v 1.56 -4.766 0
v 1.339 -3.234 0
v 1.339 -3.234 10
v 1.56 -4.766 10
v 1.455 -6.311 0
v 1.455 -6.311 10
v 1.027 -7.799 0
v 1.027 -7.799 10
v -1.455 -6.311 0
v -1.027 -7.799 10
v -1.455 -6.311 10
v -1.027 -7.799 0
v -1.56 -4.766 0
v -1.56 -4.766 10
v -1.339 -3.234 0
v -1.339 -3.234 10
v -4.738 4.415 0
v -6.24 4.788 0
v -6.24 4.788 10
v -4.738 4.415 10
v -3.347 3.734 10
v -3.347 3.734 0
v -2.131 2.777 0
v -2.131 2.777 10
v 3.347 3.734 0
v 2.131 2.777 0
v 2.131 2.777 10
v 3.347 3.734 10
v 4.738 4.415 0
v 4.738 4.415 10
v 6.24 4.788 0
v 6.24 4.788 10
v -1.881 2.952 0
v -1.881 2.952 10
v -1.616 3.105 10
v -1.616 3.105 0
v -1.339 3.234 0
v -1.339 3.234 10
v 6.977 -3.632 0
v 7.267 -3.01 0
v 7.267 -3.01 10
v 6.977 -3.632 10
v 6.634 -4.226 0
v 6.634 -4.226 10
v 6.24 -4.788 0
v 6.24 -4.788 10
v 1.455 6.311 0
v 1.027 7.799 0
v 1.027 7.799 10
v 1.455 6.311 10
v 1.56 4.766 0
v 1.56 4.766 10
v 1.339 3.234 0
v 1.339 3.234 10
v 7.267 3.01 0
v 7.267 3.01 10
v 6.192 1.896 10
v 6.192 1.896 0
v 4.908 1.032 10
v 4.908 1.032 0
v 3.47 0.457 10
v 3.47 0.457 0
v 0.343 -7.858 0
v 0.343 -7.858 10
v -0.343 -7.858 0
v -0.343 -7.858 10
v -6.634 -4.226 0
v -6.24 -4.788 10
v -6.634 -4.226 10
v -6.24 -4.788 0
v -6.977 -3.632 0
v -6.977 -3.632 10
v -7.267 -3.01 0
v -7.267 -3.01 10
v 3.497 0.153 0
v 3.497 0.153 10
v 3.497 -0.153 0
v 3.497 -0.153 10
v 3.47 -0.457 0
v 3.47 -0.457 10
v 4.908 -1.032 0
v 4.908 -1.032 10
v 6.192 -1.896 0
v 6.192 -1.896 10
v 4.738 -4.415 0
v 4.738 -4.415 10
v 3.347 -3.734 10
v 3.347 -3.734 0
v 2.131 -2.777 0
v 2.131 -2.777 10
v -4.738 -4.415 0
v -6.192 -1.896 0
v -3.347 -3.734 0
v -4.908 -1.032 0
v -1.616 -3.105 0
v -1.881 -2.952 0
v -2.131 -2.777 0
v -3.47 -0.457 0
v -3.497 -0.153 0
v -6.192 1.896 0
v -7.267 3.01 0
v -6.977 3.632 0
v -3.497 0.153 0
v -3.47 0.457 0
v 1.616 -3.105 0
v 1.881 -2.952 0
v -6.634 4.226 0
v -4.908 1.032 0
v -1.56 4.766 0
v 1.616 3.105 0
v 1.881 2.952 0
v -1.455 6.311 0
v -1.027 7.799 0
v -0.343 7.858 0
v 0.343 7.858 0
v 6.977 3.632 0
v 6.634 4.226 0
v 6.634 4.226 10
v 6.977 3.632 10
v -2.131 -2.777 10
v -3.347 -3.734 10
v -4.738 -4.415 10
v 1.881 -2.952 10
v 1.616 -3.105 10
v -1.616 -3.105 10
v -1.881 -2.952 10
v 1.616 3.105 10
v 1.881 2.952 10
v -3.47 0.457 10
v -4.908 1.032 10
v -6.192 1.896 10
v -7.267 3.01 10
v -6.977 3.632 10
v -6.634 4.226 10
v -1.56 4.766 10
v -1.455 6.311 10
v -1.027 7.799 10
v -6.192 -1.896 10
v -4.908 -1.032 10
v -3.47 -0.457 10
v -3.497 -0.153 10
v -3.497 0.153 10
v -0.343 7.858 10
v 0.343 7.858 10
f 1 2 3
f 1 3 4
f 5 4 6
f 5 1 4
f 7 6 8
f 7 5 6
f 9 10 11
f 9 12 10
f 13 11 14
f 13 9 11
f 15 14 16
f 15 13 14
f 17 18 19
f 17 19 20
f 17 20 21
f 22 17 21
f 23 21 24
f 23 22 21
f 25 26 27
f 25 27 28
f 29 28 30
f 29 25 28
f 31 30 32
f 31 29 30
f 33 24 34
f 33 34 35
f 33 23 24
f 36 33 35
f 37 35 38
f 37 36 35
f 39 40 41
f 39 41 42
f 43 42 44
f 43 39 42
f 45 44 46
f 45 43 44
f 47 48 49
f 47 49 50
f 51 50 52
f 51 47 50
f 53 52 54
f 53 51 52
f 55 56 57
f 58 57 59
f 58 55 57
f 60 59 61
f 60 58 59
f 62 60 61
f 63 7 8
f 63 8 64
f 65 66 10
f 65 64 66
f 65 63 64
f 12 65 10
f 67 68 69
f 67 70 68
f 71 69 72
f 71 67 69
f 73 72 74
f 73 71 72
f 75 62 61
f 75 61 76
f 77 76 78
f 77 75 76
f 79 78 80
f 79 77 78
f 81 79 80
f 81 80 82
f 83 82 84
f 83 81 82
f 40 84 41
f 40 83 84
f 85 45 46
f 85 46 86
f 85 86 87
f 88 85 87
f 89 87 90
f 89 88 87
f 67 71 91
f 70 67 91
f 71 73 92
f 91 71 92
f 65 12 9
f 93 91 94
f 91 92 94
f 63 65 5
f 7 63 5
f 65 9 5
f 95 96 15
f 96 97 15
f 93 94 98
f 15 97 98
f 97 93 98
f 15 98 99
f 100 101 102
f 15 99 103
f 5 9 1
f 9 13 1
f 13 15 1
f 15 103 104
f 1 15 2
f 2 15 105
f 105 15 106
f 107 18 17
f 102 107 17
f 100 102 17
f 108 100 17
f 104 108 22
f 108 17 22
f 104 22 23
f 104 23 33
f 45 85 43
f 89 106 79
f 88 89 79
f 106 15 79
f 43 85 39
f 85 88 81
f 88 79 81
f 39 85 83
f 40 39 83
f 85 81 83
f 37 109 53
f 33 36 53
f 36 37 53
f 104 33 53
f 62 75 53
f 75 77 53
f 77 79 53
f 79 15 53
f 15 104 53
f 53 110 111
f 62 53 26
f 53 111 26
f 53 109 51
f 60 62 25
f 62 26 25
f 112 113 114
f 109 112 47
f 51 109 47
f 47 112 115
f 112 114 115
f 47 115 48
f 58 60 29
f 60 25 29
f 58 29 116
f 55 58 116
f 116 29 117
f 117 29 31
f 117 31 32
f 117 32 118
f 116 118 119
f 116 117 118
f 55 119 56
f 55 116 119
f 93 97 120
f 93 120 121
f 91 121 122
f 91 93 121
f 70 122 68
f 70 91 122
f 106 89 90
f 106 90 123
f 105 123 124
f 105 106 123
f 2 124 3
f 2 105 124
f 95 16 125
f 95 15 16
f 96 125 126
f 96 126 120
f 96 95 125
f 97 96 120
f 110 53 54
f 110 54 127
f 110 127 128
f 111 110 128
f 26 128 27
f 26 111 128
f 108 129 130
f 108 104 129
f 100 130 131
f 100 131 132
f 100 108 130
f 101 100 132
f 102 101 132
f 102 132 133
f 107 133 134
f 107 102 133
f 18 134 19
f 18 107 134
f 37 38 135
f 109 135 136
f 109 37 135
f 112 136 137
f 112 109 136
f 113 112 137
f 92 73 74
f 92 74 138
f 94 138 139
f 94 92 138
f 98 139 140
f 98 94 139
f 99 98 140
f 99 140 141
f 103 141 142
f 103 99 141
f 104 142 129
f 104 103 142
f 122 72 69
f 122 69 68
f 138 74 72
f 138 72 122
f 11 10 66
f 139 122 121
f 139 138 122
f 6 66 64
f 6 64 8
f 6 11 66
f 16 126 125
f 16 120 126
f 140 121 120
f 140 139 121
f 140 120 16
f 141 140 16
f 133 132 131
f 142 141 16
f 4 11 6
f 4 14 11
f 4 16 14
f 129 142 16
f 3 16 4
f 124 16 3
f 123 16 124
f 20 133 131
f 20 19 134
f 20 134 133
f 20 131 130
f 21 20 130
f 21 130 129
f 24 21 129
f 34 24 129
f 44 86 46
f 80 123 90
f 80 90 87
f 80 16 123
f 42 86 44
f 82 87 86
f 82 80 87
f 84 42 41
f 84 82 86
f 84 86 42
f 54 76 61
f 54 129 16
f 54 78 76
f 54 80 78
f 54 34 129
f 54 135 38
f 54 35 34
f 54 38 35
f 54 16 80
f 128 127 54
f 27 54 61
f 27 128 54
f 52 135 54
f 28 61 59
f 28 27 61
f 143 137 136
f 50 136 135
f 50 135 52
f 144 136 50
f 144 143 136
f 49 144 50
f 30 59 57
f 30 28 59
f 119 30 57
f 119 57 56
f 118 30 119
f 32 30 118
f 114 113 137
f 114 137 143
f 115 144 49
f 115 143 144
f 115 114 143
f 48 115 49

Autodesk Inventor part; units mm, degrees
sketch "Sketch1" plane through (0, 0, 0) normal (0, 0, 1) x (1, 0, 0)
  circle A0 centre (0, 0) radius 7.8659
  dimension "d0" = 15.7318
extrude "Extrusion1" add sketch "Sketch1" along normal blind 10
ref_plane "Work Plane2" through (0, 0, 5) normal (0, 0, 1) x (1, 0, 0)
sketch "Sketch2" plane through (0, 0, 0) normal (0, 0, -1) x (-1, 0, 0)
  circle A0 centre (0, 0) radius 7.8659 projected
  circle A1 centre (0, 0) radius 6
  dimension "d3" = 12
surface extrude "Pitch Diameter" sketch "Sketch2" against normal through all shown no curves A1
ref_plane "Work Plane8" through (0, 0, 0) normal (0.8660254, 0.5, 0) x (0, 0, 1)
ref_plane "Work Plane9" through (0, 0, 0) normal (1, 0, 0) x (0, 1, 0)
spur gear teeth "Spur Gear" teeth 6 pitch diameter 12 tip diameter 15.7318 root diameter 7 face width 10 start plane through (0, 0, 0) normal (0, 0, -1) x (-1, 0, 0)
equation "\"d0\" = da_da"
equation "\"d1\" = da_b"
equation "\"d3\" = da_d"
equation "\"da_da\" = 15.731825"
equation "\"da_b\" = 10"
equation "\"da_d\" = 12"
properties part number "Spur Gear1" material "Steel"
